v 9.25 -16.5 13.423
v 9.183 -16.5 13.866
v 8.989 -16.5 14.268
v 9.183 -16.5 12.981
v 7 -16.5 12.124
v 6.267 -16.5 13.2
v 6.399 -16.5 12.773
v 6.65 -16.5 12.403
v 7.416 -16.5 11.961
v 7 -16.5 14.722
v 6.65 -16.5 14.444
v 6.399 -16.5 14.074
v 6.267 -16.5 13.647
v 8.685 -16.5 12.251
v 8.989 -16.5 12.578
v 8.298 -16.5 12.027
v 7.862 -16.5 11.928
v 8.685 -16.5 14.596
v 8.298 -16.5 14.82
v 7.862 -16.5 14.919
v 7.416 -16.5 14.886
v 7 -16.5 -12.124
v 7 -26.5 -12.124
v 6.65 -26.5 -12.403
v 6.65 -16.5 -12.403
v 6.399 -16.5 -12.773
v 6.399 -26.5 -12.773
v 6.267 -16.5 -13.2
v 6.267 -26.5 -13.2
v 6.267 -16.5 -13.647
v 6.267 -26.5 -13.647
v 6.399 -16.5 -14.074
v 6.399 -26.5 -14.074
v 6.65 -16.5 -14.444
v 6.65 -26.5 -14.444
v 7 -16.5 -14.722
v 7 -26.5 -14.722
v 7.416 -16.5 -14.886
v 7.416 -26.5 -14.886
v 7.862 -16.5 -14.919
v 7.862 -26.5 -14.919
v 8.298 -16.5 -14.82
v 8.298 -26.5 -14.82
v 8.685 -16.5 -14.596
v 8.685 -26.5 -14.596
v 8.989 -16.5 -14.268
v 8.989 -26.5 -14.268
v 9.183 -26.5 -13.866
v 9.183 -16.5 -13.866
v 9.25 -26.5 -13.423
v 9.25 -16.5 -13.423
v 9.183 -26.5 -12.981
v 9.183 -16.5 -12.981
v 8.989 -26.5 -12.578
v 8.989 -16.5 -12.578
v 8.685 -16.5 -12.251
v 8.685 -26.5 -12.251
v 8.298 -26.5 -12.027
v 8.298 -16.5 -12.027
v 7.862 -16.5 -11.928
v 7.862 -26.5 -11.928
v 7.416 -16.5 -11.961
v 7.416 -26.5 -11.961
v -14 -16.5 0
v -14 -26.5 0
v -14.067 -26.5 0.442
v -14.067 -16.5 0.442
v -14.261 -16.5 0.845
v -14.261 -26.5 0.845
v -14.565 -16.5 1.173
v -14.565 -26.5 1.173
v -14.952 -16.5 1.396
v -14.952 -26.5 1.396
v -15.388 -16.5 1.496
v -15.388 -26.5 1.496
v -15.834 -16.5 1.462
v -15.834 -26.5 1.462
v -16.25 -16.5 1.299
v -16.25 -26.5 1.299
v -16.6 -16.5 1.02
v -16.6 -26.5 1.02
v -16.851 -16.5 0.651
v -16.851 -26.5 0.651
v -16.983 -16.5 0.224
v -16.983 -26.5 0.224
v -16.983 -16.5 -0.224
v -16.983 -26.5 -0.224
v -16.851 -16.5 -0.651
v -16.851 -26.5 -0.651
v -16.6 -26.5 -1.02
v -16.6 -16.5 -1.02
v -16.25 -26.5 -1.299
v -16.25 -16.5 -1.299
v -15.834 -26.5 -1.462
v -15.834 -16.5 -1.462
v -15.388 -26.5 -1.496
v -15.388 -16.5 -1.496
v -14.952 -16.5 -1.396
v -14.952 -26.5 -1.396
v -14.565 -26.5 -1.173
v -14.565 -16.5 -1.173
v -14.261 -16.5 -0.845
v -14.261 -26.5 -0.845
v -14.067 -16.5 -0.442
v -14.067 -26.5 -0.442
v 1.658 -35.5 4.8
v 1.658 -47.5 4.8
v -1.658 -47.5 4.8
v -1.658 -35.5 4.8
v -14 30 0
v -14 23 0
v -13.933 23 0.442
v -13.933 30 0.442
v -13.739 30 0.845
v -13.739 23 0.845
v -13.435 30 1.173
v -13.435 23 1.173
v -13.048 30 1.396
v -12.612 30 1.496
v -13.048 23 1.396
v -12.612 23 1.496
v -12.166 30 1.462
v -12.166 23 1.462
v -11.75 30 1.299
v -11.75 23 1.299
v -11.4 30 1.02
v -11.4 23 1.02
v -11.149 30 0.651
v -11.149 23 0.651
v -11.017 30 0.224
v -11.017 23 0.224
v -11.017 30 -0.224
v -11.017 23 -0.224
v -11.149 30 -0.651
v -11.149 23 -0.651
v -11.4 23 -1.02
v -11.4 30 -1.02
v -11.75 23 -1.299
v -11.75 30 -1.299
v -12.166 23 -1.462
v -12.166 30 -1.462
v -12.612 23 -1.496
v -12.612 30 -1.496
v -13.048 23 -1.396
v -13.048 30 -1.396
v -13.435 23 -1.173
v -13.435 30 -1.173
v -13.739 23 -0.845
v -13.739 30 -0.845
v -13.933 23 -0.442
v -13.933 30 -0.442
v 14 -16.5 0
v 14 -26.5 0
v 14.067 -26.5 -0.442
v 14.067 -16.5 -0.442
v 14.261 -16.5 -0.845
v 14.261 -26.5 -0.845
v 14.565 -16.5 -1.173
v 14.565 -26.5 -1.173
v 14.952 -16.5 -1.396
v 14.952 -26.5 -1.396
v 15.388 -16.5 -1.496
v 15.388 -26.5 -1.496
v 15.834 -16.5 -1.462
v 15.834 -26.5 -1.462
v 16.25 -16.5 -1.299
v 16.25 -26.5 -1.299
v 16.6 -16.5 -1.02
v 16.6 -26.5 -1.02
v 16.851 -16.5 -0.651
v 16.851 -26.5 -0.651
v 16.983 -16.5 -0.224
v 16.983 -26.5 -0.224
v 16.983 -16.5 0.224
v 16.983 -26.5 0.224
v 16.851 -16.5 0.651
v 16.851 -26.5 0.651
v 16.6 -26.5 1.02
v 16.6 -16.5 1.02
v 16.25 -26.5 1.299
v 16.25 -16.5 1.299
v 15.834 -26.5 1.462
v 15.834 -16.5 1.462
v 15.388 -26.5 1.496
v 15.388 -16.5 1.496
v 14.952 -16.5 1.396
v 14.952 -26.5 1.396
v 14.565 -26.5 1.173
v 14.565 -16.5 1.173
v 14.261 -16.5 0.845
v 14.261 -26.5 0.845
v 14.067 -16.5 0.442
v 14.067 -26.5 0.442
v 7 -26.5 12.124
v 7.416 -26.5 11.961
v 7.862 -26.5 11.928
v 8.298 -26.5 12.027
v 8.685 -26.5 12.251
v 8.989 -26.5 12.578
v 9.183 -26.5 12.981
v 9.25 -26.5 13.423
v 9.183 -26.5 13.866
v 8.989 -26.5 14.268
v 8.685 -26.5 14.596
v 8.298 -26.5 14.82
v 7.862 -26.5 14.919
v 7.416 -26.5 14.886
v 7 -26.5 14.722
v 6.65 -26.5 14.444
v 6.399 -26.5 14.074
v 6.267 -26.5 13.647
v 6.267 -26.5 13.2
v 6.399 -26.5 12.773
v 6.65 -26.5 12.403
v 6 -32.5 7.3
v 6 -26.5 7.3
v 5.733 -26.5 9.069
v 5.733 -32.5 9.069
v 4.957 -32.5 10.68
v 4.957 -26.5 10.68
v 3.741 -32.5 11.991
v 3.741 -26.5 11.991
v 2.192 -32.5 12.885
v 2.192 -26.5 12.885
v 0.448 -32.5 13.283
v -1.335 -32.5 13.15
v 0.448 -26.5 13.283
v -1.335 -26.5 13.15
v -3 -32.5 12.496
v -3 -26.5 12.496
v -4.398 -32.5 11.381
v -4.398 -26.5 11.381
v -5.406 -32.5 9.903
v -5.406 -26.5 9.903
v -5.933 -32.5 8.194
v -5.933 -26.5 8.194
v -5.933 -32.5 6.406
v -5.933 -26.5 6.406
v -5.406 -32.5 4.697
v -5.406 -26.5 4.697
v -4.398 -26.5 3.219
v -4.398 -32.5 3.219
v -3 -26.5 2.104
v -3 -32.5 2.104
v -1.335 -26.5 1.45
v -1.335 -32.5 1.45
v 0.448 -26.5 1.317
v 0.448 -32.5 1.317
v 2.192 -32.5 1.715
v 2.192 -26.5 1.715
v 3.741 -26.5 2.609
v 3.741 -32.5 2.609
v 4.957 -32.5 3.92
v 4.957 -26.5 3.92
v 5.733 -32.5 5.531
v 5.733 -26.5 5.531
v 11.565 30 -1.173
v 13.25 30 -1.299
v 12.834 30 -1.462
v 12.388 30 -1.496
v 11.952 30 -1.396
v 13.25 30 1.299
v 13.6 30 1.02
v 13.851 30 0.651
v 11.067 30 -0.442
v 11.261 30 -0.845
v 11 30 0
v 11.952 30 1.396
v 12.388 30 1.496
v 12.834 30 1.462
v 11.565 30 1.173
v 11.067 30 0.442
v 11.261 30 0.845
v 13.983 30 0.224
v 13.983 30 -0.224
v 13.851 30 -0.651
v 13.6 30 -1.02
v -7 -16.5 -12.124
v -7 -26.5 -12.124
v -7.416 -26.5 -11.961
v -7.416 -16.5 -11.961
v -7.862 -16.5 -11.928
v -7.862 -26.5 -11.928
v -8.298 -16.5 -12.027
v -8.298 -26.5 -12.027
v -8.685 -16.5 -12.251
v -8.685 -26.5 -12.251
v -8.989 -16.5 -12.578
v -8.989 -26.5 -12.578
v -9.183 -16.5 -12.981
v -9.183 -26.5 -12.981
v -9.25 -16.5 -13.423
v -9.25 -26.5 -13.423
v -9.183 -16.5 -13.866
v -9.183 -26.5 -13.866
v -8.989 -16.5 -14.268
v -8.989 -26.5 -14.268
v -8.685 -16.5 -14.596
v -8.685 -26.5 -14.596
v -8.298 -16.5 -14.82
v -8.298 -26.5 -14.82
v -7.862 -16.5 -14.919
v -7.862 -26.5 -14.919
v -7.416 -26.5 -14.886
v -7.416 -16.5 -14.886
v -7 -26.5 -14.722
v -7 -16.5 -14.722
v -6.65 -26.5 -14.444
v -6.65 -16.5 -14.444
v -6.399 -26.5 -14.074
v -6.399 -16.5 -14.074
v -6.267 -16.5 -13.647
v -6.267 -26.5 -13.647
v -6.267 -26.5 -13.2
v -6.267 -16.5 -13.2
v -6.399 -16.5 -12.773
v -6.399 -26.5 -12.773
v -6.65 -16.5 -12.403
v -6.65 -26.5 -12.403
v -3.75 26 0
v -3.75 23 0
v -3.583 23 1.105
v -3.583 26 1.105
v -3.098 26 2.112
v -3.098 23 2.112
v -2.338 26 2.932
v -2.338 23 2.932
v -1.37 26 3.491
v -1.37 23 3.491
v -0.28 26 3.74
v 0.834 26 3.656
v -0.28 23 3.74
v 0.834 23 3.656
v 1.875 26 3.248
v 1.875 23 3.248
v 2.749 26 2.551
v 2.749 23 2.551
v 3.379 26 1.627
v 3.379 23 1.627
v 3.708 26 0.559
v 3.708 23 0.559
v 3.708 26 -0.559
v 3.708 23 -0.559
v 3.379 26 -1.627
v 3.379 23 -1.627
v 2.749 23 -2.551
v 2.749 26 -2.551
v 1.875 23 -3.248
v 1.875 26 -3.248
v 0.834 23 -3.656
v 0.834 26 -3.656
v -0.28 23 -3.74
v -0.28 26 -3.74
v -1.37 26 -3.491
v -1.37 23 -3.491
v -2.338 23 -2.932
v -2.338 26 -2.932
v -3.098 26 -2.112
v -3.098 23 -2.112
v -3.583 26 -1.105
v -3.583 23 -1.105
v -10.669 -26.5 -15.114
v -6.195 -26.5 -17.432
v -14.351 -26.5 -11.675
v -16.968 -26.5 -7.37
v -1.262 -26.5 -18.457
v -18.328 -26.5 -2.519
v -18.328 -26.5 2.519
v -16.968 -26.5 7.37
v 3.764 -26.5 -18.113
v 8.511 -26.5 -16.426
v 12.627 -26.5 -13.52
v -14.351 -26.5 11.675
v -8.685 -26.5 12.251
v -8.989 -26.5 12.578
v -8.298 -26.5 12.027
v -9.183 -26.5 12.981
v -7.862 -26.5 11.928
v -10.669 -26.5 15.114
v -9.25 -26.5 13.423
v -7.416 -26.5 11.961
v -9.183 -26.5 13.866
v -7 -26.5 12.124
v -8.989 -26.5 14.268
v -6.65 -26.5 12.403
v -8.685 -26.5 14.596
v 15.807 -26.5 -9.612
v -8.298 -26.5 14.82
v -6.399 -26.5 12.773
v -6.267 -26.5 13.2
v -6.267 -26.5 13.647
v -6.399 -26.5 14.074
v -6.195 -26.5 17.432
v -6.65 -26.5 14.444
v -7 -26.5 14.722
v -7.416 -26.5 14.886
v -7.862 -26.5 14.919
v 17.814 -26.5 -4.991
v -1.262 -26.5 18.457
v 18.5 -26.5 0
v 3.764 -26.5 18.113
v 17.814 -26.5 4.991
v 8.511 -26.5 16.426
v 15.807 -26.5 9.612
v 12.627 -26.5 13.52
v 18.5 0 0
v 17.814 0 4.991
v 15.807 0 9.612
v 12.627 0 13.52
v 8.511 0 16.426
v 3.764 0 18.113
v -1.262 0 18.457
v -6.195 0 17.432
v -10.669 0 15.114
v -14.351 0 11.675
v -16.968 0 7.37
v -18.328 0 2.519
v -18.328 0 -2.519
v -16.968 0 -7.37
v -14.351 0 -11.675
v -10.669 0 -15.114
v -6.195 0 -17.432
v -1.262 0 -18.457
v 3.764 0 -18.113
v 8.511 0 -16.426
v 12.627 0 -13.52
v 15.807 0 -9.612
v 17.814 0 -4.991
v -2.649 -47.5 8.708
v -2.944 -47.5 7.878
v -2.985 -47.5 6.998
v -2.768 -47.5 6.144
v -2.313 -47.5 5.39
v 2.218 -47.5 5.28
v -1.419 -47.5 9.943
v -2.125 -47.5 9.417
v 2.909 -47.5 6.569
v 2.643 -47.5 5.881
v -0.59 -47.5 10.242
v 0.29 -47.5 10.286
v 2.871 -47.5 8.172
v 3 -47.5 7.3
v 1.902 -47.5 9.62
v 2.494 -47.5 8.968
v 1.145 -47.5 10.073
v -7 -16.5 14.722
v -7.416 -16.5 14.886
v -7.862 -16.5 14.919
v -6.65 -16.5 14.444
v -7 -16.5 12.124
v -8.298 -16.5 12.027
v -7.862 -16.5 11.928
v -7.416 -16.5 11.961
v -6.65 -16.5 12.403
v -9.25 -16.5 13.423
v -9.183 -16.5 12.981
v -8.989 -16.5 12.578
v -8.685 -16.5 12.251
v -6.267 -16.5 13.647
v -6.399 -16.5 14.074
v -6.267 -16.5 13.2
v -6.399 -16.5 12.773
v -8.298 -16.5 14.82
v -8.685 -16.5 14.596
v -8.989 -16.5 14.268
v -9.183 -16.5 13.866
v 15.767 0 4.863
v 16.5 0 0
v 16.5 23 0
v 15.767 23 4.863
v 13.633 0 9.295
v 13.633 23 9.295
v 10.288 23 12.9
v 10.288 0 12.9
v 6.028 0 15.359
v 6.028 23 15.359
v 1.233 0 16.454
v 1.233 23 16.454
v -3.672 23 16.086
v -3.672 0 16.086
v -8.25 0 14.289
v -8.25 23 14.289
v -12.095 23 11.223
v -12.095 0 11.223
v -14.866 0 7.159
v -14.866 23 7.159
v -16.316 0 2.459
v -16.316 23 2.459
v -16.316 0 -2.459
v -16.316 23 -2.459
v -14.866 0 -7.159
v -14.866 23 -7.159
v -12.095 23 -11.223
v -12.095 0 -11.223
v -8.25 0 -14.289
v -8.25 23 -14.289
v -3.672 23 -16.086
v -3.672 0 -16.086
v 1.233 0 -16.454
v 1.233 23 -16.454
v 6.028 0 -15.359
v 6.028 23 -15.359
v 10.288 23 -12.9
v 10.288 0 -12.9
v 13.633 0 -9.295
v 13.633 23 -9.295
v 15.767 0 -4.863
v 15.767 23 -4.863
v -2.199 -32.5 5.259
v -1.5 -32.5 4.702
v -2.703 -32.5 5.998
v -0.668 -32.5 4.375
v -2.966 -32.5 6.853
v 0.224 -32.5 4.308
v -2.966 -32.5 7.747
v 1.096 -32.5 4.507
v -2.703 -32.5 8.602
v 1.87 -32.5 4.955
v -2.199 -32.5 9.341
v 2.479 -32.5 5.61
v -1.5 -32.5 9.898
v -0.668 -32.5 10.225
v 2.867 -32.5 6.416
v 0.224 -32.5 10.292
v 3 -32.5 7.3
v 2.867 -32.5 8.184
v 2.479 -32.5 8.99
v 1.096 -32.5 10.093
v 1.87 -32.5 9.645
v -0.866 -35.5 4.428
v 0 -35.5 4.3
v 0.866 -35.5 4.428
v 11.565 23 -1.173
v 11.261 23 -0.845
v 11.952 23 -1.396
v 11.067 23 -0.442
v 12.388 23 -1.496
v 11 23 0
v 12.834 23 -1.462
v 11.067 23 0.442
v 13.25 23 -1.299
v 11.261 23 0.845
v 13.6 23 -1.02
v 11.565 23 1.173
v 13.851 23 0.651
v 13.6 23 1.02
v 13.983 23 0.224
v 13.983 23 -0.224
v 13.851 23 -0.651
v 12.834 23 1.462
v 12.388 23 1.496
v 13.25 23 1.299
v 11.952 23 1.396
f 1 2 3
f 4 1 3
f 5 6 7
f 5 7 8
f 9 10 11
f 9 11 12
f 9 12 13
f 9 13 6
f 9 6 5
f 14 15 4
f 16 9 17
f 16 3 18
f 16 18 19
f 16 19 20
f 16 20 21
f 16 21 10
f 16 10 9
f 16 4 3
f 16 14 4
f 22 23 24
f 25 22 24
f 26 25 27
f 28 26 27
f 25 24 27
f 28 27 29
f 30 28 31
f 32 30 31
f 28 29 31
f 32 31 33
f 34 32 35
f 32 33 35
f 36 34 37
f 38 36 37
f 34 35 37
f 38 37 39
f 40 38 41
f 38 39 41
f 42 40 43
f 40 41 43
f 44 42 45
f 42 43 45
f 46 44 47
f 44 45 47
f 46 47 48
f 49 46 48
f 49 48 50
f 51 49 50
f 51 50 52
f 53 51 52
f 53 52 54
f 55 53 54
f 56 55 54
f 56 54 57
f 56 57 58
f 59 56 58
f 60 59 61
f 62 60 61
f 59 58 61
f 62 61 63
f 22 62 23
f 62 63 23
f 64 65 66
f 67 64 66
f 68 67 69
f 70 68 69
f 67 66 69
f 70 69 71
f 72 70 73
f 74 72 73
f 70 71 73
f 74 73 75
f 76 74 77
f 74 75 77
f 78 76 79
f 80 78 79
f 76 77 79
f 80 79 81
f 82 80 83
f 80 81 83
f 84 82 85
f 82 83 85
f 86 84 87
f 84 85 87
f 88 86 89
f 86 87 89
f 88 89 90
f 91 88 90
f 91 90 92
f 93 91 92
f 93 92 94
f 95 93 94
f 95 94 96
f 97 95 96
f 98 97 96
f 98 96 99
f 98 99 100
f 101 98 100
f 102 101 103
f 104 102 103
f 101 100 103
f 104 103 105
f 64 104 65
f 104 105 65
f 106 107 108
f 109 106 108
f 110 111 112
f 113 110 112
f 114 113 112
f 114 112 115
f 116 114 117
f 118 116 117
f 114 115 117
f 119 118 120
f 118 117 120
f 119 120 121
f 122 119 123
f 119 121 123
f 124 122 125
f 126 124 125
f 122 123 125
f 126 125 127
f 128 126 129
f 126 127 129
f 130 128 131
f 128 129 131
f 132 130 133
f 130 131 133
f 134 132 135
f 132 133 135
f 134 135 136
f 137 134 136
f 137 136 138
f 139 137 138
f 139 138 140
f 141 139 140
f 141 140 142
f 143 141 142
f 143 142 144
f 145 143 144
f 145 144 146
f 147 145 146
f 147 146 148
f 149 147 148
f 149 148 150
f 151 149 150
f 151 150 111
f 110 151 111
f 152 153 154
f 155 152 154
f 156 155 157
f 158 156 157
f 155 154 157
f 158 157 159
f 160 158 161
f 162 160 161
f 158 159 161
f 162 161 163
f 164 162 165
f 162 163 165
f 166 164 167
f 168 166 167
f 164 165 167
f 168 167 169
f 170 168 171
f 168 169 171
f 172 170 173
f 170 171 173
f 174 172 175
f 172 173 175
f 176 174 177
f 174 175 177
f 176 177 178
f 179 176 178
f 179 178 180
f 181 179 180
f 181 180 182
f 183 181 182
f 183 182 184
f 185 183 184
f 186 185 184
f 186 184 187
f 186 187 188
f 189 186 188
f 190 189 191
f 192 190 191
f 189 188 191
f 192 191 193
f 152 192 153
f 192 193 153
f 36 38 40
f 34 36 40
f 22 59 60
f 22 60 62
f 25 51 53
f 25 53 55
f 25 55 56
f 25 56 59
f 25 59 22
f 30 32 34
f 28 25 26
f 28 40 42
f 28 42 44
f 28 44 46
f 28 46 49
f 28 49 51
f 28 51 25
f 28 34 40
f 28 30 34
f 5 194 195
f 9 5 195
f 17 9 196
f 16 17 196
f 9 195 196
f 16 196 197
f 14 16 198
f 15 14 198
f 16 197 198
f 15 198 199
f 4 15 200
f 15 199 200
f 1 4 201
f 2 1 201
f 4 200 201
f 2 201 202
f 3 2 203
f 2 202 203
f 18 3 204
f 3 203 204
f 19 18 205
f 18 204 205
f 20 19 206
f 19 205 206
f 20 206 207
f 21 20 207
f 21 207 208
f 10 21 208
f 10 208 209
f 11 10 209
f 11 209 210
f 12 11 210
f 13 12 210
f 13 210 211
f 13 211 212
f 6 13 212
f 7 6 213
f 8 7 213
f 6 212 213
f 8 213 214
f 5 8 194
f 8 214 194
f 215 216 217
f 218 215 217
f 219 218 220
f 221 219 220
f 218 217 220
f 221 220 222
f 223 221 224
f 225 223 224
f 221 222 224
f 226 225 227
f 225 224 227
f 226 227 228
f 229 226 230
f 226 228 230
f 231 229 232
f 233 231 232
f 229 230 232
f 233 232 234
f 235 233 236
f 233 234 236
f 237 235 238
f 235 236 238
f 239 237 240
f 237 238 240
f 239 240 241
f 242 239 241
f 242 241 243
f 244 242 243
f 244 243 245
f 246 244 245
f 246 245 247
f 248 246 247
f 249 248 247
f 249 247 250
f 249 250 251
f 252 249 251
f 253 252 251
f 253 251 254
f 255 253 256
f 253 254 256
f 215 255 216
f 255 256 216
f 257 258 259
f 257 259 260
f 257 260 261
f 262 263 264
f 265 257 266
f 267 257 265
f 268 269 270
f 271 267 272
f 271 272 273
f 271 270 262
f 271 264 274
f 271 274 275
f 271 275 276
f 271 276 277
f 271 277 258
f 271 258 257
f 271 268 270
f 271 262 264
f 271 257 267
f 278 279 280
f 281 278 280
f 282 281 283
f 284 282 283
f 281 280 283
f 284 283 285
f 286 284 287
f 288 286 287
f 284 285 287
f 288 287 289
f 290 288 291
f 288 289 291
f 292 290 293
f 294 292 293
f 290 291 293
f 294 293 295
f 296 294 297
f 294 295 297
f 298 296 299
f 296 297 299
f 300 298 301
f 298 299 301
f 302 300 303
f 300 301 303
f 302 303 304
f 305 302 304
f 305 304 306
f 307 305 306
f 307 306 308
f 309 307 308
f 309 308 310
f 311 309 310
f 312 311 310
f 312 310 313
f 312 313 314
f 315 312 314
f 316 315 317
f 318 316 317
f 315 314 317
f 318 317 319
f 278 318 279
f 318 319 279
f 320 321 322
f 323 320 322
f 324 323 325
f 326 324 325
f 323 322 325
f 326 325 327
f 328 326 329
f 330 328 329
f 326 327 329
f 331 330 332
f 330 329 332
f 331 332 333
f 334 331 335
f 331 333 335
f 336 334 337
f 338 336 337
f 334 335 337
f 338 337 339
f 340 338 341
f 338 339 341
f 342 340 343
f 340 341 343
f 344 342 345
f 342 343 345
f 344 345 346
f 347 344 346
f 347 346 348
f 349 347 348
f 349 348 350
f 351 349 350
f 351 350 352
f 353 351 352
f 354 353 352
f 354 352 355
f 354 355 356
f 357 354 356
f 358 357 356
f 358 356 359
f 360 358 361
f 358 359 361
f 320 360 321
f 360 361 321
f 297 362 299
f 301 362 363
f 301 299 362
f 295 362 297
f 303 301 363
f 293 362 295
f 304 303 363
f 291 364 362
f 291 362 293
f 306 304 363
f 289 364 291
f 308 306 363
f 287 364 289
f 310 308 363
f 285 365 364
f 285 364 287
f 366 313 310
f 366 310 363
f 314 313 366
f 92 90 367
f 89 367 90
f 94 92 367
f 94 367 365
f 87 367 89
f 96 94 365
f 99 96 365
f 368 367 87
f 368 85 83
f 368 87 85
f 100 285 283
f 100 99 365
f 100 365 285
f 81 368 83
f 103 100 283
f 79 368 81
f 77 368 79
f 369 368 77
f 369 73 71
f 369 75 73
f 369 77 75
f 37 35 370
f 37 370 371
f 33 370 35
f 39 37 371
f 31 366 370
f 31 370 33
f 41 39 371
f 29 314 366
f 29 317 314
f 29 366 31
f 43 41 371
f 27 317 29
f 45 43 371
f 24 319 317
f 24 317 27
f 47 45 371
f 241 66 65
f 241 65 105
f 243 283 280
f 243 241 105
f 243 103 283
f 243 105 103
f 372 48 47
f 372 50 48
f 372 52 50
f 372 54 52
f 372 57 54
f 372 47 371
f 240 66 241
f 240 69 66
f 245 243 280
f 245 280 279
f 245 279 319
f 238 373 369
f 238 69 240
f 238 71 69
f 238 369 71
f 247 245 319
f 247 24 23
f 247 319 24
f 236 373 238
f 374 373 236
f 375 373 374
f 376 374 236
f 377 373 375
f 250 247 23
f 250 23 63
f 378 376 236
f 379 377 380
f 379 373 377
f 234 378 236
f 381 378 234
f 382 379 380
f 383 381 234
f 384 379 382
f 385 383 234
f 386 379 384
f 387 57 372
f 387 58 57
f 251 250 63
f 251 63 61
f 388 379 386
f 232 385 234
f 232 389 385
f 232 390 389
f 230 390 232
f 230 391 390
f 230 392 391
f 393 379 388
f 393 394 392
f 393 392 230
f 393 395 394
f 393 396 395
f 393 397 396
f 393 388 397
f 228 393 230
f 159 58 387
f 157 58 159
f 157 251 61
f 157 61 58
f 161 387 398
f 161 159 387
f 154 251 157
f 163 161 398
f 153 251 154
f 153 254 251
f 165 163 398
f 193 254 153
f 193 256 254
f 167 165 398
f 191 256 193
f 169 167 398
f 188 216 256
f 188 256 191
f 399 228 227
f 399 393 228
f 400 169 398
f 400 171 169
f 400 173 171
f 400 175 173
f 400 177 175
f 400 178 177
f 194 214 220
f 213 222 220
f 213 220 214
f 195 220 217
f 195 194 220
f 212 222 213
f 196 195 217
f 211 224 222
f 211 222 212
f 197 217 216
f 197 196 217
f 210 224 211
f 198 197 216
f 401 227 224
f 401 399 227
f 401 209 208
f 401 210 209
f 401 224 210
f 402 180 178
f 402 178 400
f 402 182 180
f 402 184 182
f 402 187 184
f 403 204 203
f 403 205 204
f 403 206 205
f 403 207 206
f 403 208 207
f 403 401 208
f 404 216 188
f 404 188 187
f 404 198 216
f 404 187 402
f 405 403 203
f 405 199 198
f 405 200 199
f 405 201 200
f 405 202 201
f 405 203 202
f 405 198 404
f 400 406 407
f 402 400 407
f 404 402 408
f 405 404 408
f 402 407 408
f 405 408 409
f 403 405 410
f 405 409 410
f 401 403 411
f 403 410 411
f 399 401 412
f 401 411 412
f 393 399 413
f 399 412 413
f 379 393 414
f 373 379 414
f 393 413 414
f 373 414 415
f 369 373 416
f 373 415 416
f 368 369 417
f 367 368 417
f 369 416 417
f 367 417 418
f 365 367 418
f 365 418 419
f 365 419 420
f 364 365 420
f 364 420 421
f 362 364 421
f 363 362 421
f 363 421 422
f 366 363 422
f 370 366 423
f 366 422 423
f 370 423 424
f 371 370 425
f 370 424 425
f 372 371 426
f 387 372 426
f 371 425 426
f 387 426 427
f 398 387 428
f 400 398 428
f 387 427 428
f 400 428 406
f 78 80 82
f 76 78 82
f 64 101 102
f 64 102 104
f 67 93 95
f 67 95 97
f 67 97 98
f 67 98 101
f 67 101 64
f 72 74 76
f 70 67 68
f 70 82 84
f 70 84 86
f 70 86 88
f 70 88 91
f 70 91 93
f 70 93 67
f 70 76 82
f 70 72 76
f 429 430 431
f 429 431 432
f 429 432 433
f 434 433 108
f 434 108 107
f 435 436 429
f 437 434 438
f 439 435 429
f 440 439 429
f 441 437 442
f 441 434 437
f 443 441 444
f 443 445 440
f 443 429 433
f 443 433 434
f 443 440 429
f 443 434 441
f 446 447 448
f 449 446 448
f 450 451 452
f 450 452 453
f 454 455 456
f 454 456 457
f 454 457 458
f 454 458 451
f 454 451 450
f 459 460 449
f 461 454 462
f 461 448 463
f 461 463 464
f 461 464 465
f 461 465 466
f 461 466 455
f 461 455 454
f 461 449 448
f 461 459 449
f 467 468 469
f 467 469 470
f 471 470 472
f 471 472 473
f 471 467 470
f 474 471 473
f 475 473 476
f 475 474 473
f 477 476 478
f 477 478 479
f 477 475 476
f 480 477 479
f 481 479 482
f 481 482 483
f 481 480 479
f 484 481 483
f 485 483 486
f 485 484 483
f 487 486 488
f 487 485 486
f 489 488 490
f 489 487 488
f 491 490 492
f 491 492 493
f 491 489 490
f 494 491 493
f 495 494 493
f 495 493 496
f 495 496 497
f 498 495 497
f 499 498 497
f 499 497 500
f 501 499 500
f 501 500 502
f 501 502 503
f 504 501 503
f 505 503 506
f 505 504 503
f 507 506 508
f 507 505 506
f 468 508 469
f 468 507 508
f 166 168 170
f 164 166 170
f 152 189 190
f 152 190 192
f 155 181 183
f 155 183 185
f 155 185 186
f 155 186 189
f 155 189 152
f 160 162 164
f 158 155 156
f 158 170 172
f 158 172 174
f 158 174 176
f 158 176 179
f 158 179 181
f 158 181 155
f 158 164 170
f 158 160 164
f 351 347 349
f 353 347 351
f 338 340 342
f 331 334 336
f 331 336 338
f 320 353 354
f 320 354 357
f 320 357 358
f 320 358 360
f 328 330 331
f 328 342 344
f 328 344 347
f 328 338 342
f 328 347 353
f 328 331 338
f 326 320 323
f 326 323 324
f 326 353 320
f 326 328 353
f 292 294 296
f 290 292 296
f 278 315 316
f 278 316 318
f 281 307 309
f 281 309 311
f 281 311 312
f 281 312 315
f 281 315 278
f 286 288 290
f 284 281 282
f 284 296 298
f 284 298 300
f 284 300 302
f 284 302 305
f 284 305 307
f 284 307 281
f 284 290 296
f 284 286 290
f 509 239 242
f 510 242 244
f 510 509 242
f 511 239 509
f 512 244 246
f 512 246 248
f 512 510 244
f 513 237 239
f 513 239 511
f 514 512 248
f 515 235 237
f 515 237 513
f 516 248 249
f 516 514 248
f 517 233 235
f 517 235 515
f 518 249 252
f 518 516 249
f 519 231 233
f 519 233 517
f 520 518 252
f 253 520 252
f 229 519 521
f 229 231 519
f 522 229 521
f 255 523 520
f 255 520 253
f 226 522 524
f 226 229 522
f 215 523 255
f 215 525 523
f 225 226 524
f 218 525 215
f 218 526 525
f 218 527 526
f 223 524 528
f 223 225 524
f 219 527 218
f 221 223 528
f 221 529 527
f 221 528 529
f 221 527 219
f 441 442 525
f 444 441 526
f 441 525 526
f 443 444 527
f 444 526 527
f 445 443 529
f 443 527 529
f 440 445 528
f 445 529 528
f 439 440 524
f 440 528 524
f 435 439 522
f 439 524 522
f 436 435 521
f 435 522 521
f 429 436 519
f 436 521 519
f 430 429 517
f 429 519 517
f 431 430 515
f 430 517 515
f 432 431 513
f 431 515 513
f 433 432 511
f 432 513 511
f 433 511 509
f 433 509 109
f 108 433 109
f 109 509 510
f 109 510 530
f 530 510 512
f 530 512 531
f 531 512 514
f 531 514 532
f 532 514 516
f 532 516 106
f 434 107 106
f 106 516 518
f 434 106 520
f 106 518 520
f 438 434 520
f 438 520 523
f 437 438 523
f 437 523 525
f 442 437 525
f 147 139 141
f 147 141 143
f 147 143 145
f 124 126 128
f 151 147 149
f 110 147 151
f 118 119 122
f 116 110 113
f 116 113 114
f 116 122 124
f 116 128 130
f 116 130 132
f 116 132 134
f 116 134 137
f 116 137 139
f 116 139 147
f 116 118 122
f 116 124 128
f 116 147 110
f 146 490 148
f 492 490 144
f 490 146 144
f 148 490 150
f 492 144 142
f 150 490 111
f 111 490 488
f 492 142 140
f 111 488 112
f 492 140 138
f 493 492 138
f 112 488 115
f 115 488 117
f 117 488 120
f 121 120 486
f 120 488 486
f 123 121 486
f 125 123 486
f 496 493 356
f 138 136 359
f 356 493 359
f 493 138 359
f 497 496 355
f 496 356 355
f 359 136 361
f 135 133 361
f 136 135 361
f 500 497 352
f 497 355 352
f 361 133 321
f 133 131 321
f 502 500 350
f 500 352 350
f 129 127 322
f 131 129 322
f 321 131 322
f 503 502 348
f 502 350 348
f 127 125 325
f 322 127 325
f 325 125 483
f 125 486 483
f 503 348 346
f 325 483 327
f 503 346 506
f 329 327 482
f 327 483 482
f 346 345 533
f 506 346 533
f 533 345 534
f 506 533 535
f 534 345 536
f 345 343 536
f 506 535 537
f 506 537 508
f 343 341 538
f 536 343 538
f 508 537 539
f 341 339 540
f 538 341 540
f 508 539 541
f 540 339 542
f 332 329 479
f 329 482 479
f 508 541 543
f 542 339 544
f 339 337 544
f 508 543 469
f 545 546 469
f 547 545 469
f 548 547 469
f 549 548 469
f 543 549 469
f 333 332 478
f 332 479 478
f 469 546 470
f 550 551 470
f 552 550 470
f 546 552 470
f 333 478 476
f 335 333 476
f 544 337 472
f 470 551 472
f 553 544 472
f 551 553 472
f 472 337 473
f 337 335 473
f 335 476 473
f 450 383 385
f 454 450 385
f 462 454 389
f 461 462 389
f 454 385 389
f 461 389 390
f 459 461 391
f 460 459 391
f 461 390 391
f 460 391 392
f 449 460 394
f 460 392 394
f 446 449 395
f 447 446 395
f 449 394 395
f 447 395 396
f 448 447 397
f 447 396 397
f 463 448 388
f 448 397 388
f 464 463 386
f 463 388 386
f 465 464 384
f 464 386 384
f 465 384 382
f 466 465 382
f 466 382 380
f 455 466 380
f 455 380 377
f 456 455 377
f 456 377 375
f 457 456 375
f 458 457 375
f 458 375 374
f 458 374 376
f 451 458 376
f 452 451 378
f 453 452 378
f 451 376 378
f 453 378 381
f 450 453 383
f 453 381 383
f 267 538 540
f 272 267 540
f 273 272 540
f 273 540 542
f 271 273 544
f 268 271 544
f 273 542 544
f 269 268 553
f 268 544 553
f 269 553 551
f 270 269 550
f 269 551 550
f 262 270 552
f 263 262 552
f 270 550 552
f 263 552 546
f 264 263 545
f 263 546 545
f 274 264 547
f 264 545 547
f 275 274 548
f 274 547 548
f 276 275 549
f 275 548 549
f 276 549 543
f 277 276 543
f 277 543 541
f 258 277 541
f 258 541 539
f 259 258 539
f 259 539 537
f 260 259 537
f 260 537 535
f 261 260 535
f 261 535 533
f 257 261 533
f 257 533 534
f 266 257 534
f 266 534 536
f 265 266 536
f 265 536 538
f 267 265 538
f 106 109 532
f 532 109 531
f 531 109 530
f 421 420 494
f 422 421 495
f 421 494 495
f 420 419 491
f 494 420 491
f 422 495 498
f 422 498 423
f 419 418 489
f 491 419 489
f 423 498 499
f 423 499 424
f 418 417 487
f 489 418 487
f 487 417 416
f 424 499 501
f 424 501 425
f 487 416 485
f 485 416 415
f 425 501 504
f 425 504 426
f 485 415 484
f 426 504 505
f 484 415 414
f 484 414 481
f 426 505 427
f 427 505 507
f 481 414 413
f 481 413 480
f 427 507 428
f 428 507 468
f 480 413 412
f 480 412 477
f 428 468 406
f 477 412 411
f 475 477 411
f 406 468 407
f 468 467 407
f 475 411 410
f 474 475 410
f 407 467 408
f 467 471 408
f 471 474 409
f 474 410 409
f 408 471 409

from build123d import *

# Parameters (mm, degrees)
F0_R      = 18.5
F0_R_2    = 16.5
F1_DEPTH  = 26.5
F2_DEPTH  = 23
F3_R      = 6
F3_R_2    = 3
F4_DEPTH  = 6
F5_DEPTH  = 21
F7_DEPTH  = 12
F3_R_3    = 1.5
F8_DEPTH  = 10
F10_COUNT = 6
F11_R     = 3.75
F11_R_2   = 1.5
F12_DEPTH = 3
F13_DEPTH = 7


with BuildPart() as f1:
    # F0 (on Front) → F1 (new body)
    with BuildSketch(Plane.XZ):
        Circle(F0_R)
        Circle(F0_R_2, mode=Mode.SUBTRACT)
        Circle(F0_R_2)
    extrude(amount=F1_DEPTH)

    # F0 (on Front) → F2 (join)
    with BuildSketch(Plane.XZ):
        Circle(F0_R_2)
    extrude(amount=-F2_DEPTH)

    # F3 (on face) → F4 (join)
    with BuildSketch(Plane.XZ.offset(26.5)):
        with Locations((0, 7.3)):
            Circle(F3_R)
        with Locations((0, 7.3)):
            Circle(F3_R_2, mode=Mode.SUBTRACT)
    extrude(amount=F4_DEPTH)

    # F5 (add): a face of the model
    f5_faces = [f1.faces().sort_by_distance(p)[0] for p in [
        (0, -26.5, 7.3),
    ]]
    extrude(f5_faces, amount=F5_DEPTH)

    # F6 (on face) → F7 (cut)
    with BuildSketch(Plane.XZ.offset(47.5)):
        with BuildLine():
            Line((1.6583123952, 4.8), (-1.6583123952, 4.8))
            ThreePointArc((-1.6583123952, 4.8), (0, 4.3), (1.6583123952, 4.8))
        make_face()
    extrude(amount=-F7_DEPTH, mode=Mode.SUBTRACT)

    # F10: F8 ×6 about axis
    f10_axis = Axis((0, -5.8839749545, 0), (0, 1, 0))


with BuildPart() as f8:
    # F3 (on face) → F8 (new body)
    with BuildSketch(Plane.XZ.offset(26.5)):
        with Locations((-15.5, 0)):
            Circle(F3_R_3)
    extrude(amount=-F8_DEPTH)


with BuildPart() as f1_1:
    add(f1.part)
    for i in range(1, F10_COUNT):
        add(f8.part.rotate(f10_axis, i * 360 / F10_COUNT), mode=Mode.SUBTRACT)

    # F10#seed: cut F8
    add(f8.part, mode=Mode.SUBTRACT)

    # F11 (on face) → F12 (join)
    with BuildSketch(Plane(origin=(0, 23, 0), x_dir=(-1, 0, 0), z_dir=(0, 1, 0))):
        Circle(F11_R)
        with Locations((-12.5, 0)):
            Circle(F11_R_2)
        with Locations((12.5, 0)):
            Circle(F11_R_2)
    extrude(amount=F12_DEPTH)

    # F11 (on face) → F13 (join)
    with BuildSketch(Plane(origin=(0, 23, 0), x_dir=(-1, 0, 0), z_dir=(0, 1, 0))):
        with Locations((-12.5, 0)):
            Circle(F11_R_2)
        with Locations((12.5, 0)):
            Circle(F11_R_2)
    extrude(amount=F13_DEPTH)


solid = f1_1.part
